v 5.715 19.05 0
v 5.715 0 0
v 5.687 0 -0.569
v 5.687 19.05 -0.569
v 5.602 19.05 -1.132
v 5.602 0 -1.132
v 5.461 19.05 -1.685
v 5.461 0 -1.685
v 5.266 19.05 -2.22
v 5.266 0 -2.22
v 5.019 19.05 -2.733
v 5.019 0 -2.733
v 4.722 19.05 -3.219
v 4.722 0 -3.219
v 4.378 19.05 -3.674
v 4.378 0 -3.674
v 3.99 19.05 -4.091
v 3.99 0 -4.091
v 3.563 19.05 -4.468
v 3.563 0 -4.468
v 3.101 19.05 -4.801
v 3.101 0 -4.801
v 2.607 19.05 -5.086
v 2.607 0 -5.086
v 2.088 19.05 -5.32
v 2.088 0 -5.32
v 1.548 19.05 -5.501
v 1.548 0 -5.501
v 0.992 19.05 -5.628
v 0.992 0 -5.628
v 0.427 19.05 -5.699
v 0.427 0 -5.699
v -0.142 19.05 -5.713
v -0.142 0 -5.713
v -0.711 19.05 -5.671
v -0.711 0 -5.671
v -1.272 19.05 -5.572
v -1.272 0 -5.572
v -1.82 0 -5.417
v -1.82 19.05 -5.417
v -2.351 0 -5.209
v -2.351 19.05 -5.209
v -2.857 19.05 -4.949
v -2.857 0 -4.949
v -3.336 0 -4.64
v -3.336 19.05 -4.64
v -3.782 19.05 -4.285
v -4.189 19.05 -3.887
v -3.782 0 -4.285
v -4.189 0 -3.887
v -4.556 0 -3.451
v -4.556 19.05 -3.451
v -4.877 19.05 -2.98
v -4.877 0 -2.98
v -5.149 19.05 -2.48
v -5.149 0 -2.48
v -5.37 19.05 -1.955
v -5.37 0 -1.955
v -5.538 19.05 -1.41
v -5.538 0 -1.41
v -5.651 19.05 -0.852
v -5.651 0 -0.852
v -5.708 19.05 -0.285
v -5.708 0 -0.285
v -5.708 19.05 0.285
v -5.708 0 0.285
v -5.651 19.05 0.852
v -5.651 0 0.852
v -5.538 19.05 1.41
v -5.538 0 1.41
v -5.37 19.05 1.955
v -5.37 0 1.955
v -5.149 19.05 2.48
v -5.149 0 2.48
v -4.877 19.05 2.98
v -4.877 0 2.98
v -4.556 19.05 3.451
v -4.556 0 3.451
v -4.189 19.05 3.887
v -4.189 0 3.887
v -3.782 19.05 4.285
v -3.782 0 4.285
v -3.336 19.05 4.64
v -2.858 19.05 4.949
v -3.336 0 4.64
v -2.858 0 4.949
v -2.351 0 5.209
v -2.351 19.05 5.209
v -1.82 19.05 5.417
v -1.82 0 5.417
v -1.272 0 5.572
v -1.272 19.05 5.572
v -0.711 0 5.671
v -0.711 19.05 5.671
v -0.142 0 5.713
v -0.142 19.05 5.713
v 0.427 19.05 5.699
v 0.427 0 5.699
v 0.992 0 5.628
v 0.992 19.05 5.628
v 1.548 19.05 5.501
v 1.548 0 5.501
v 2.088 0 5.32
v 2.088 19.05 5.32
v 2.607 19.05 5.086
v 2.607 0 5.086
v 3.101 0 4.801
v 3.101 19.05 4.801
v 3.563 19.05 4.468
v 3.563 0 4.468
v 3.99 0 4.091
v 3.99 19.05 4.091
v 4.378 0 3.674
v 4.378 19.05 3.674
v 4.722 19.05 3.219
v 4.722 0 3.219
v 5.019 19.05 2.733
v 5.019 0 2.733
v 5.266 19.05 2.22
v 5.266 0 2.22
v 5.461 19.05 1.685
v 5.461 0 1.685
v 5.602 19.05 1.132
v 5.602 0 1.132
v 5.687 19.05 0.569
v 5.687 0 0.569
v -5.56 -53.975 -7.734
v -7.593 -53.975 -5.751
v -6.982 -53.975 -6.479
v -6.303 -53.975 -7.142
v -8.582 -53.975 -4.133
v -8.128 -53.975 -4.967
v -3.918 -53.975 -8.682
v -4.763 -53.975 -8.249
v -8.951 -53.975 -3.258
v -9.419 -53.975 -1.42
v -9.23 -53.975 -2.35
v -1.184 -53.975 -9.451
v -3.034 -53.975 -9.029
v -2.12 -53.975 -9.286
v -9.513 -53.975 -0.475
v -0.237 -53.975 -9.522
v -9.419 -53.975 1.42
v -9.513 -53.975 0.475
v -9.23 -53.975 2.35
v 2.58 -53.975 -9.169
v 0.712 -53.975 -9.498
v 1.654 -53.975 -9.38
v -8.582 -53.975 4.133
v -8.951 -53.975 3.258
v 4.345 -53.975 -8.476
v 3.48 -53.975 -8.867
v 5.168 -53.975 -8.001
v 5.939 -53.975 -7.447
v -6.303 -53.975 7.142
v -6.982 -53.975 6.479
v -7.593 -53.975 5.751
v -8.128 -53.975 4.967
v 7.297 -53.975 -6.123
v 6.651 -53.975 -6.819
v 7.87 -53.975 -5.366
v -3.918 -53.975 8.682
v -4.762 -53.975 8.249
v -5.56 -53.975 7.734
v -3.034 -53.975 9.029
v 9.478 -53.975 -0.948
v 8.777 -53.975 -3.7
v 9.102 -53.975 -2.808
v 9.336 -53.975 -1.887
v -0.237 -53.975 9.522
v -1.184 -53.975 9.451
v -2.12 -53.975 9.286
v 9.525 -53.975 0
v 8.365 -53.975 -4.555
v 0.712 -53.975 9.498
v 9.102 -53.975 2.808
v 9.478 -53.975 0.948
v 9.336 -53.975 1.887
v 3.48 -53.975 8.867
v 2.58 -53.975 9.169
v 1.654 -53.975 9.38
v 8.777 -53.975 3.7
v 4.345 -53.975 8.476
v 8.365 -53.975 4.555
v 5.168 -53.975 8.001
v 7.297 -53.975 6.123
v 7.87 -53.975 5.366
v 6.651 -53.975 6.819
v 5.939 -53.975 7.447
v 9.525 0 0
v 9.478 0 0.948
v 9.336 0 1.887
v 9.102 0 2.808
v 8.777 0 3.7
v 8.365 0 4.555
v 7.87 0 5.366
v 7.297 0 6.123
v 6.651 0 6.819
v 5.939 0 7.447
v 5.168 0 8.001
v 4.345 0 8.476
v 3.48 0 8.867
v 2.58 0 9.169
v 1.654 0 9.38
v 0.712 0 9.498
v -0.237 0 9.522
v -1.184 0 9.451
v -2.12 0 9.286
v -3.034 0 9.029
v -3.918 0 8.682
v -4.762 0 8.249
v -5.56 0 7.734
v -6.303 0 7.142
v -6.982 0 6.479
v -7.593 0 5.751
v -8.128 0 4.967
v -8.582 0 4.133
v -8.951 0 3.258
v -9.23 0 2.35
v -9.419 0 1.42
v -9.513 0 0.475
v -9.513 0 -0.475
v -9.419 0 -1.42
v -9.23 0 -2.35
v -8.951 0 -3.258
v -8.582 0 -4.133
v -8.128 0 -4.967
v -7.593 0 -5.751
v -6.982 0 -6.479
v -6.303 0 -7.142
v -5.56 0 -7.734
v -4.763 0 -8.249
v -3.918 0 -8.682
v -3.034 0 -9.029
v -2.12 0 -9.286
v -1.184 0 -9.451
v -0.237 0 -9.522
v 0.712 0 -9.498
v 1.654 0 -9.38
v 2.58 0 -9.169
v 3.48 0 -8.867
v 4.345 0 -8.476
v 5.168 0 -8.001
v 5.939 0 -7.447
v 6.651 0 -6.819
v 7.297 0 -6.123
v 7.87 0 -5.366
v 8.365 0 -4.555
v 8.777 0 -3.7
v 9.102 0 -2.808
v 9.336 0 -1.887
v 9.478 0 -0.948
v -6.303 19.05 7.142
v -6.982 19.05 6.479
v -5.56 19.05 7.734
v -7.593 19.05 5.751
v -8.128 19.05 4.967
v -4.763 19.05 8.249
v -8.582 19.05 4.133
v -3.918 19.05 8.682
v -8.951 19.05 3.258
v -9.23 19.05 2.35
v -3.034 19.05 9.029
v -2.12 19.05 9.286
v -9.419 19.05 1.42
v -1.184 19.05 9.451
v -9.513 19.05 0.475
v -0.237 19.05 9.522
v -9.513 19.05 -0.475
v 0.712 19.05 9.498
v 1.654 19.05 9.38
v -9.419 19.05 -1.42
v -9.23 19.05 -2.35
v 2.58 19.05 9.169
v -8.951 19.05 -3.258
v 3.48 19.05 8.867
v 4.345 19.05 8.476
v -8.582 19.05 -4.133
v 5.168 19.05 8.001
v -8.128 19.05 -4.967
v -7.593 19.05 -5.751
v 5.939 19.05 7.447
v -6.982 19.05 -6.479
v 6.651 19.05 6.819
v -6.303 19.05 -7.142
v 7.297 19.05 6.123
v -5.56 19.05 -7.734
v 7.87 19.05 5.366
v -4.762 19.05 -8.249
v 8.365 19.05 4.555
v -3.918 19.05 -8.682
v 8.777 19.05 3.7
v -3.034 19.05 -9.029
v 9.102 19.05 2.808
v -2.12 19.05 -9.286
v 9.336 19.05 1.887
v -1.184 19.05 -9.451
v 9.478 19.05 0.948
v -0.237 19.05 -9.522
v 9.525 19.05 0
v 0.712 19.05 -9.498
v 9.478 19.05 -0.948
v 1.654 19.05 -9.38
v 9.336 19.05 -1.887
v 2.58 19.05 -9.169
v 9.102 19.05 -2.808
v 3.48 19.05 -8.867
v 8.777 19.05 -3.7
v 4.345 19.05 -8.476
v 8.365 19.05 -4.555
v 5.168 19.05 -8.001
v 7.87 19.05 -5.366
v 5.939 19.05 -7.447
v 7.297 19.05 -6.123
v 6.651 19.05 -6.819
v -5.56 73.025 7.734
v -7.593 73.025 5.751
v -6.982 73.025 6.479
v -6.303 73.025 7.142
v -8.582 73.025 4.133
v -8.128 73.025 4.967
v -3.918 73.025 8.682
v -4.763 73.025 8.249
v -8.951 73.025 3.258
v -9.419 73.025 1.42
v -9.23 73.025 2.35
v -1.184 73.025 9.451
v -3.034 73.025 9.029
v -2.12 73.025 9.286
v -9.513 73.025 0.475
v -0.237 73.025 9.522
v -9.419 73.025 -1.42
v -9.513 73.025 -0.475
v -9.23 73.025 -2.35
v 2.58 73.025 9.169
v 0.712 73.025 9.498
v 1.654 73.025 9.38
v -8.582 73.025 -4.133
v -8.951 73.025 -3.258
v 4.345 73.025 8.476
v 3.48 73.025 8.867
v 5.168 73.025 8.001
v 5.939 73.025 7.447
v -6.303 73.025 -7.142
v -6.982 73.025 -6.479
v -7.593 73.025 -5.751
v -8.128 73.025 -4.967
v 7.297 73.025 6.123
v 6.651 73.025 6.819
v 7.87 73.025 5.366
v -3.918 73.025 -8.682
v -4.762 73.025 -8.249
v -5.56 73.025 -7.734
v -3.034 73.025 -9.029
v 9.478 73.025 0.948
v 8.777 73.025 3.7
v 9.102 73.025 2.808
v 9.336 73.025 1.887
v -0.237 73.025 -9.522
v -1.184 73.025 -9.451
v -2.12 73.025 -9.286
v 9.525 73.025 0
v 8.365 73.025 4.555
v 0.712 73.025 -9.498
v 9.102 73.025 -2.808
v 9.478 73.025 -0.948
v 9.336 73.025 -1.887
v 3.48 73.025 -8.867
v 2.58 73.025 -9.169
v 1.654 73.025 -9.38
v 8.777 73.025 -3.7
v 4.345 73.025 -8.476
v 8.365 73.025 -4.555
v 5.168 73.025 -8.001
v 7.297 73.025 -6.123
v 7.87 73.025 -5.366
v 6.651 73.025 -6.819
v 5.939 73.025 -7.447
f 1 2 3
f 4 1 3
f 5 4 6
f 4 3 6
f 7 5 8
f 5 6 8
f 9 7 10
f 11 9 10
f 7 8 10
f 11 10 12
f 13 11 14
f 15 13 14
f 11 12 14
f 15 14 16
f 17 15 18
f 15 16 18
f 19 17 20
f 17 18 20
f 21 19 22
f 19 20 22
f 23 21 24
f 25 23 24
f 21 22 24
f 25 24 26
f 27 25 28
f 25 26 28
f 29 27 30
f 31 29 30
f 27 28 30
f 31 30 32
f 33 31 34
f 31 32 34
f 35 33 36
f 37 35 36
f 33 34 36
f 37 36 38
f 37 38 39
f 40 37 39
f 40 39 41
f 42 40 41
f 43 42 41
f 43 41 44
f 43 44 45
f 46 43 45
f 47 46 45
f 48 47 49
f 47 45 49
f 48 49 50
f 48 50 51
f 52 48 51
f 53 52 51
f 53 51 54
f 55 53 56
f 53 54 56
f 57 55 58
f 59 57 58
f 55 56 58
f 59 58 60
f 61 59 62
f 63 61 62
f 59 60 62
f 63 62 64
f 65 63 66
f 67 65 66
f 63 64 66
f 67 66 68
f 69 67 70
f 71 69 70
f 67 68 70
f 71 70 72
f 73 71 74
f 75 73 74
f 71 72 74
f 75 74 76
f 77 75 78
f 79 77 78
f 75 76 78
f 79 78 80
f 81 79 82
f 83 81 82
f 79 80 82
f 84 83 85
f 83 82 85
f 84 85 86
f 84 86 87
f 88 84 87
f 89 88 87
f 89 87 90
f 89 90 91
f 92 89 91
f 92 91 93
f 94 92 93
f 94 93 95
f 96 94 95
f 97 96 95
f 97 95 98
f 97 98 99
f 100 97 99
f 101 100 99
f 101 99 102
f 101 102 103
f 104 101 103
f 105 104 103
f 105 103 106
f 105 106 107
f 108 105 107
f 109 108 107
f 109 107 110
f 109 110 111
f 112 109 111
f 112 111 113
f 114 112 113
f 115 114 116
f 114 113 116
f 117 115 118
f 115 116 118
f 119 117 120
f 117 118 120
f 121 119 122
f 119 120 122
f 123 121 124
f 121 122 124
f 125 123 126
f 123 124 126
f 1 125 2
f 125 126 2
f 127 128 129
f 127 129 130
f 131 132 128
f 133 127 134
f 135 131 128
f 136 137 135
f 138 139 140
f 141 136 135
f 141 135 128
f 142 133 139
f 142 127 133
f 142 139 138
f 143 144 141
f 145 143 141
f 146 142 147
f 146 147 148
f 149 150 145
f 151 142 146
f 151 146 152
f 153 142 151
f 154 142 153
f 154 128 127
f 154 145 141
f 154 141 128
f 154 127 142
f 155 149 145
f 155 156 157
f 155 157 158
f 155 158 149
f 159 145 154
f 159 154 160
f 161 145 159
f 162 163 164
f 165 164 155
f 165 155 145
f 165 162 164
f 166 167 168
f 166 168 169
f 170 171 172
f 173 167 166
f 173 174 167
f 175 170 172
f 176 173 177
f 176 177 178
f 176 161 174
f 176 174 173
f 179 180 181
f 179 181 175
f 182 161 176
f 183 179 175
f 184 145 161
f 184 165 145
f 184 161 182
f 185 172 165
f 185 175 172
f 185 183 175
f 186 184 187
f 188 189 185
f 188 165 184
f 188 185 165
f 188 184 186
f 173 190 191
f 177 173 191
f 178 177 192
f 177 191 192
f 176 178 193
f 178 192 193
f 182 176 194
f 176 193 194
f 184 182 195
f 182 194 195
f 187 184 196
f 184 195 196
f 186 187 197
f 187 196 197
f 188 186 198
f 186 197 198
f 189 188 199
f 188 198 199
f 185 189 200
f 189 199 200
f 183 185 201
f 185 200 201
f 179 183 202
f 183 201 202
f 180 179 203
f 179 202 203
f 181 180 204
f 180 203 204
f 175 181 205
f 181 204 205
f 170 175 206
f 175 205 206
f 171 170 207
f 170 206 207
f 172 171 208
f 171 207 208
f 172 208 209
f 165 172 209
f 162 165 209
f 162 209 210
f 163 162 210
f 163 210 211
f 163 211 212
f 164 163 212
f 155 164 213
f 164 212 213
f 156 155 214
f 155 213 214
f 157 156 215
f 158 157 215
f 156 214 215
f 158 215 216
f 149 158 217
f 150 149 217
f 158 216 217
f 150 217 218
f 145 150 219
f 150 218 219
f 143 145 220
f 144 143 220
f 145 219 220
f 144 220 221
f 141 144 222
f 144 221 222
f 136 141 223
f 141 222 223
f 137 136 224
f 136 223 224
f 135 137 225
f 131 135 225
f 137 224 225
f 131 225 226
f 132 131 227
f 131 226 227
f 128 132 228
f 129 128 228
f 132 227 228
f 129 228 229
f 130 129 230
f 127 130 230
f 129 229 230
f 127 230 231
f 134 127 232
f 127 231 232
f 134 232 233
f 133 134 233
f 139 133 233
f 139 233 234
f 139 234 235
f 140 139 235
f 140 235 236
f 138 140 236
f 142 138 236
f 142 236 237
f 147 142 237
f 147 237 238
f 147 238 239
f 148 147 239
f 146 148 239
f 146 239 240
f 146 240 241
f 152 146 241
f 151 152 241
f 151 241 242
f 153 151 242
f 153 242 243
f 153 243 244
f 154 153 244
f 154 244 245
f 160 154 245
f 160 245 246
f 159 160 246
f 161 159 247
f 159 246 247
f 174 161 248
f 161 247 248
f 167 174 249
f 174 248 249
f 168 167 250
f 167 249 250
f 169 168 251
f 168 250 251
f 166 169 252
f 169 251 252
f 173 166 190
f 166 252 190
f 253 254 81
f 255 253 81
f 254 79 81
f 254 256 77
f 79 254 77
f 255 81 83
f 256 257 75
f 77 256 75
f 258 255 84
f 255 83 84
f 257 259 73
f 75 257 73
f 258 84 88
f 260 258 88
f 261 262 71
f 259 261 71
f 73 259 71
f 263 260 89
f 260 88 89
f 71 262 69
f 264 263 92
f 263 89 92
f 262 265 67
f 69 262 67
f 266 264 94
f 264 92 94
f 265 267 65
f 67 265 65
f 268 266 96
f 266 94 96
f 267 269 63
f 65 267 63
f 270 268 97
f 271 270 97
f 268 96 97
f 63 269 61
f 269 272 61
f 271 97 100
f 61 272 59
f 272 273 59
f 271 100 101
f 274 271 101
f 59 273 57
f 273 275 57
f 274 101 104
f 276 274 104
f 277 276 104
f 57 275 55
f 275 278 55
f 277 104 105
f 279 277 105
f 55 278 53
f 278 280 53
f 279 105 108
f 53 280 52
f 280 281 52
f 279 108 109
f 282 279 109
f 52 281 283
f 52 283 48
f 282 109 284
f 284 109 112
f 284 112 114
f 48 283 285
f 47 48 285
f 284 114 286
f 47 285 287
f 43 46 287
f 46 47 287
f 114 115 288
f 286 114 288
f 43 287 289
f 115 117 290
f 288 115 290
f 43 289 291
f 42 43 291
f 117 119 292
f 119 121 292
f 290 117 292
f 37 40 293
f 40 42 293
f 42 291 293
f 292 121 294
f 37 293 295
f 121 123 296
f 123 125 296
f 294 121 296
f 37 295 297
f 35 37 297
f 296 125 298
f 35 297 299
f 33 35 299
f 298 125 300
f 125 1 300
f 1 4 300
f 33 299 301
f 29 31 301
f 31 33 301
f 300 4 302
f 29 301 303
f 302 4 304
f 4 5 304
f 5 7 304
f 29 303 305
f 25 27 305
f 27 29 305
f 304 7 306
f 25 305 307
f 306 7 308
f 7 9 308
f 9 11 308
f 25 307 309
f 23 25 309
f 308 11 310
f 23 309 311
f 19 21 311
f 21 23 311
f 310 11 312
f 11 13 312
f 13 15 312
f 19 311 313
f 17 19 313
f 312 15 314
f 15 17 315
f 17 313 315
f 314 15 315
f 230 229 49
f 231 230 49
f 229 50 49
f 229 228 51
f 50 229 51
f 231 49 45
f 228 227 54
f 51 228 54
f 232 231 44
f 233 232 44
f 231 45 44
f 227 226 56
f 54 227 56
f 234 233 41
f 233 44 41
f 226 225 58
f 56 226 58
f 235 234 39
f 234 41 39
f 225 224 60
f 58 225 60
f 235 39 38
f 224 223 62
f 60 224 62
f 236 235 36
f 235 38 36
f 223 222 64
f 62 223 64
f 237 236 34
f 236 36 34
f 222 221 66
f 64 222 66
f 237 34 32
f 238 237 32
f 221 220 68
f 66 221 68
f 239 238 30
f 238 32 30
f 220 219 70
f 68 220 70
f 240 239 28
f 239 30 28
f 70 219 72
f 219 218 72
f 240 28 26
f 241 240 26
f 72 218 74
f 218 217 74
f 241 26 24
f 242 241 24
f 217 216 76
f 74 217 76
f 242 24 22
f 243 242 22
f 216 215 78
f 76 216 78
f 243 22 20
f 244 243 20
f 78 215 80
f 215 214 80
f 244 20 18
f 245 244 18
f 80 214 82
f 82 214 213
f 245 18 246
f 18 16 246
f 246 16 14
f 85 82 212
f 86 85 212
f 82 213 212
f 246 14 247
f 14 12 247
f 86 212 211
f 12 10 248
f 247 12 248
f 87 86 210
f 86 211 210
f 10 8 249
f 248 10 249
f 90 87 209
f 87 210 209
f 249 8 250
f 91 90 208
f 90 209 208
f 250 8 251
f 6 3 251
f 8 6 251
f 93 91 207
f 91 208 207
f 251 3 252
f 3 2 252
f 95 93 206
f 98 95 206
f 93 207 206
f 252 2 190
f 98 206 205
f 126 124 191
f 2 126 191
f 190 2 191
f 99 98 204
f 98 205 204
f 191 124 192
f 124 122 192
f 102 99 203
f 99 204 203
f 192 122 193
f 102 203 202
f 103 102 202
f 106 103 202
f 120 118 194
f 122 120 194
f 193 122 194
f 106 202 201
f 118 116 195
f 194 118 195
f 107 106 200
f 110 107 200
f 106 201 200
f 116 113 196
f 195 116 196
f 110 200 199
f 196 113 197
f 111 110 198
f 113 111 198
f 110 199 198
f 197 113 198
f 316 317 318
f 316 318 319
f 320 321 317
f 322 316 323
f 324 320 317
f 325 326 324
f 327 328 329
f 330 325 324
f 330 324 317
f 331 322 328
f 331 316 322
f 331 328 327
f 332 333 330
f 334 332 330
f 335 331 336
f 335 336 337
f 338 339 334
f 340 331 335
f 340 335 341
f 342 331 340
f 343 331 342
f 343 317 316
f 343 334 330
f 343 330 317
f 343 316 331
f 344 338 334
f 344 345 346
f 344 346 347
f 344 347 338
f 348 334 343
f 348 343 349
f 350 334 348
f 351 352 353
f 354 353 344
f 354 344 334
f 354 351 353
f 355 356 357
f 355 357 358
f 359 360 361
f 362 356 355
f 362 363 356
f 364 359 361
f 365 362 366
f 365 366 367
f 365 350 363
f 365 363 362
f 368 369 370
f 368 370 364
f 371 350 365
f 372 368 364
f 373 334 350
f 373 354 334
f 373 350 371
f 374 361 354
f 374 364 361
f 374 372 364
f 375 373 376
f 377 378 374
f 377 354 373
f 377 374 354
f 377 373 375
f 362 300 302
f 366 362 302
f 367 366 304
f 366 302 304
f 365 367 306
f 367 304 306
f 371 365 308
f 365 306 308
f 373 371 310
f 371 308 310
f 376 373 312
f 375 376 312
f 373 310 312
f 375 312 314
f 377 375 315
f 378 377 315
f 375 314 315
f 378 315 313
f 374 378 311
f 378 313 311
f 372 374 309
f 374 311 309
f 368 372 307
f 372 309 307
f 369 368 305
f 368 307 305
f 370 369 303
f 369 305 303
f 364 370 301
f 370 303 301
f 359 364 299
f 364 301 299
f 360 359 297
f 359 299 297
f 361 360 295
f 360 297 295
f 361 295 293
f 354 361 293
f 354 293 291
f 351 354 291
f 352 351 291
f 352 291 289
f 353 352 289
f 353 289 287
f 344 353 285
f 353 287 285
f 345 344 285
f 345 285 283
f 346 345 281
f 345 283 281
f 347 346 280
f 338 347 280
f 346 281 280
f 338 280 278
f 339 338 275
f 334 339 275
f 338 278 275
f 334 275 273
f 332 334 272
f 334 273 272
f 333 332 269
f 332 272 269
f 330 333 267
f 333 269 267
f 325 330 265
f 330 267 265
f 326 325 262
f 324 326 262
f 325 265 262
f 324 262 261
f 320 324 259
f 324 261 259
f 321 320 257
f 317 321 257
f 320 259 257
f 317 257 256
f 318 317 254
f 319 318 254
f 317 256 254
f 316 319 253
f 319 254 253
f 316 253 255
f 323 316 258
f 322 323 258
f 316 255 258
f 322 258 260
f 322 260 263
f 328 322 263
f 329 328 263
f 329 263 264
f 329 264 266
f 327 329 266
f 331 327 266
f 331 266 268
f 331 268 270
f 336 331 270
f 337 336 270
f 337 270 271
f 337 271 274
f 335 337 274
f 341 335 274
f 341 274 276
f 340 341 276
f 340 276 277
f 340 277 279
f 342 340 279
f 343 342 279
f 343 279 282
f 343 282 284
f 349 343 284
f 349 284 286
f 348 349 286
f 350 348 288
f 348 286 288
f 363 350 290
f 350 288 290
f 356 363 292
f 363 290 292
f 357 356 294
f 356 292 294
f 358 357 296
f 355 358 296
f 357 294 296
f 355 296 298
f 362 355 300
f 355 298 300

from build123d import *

# Parameters (mm, degrees)
SKETCH1_R           = 5.715
BOSS_EXTRUDE1_DEPTH = 19.05
SKETCH2_R           = 9.525
BOSS_EXTRUDE2_DEPTH = 53.975
SKETCH3_R           = 9.525
BOSS_EXTRUDE3_DEPTH = 53.975


with BuildPart() as part:
    # Sketch1 → Boss-Extrude1 (new body)
    with BuildSketch(Plane(origin=(0, 0, 0), x_dir=(1, 0, 0), z_dir=(0, 1, 0))):
        Circle(SKETCH1_R)
    extrude(amount=BOSS_EXTRUDE1_DEPTH)

    # Sketch2 → Boss-Extrude2 (add)
    with BuildSketch(Plane(origin=(0, 19.05, 0), x_dir=(1, 0, 0), z_dir=(0, 1, 0))):
        Circle(SKETCH2_R)
    extrude(amount=BOSS_EXTRUDE2_DEPTH)

    # Sketch3 → Boss-Extrude3 (add)
    with BuildSketch(Plane.XZ):
        Circle(SKETCH3_R)
    extrude(amount=BOSS_EXTRUDE3_DEPTH)


solid = part.part
